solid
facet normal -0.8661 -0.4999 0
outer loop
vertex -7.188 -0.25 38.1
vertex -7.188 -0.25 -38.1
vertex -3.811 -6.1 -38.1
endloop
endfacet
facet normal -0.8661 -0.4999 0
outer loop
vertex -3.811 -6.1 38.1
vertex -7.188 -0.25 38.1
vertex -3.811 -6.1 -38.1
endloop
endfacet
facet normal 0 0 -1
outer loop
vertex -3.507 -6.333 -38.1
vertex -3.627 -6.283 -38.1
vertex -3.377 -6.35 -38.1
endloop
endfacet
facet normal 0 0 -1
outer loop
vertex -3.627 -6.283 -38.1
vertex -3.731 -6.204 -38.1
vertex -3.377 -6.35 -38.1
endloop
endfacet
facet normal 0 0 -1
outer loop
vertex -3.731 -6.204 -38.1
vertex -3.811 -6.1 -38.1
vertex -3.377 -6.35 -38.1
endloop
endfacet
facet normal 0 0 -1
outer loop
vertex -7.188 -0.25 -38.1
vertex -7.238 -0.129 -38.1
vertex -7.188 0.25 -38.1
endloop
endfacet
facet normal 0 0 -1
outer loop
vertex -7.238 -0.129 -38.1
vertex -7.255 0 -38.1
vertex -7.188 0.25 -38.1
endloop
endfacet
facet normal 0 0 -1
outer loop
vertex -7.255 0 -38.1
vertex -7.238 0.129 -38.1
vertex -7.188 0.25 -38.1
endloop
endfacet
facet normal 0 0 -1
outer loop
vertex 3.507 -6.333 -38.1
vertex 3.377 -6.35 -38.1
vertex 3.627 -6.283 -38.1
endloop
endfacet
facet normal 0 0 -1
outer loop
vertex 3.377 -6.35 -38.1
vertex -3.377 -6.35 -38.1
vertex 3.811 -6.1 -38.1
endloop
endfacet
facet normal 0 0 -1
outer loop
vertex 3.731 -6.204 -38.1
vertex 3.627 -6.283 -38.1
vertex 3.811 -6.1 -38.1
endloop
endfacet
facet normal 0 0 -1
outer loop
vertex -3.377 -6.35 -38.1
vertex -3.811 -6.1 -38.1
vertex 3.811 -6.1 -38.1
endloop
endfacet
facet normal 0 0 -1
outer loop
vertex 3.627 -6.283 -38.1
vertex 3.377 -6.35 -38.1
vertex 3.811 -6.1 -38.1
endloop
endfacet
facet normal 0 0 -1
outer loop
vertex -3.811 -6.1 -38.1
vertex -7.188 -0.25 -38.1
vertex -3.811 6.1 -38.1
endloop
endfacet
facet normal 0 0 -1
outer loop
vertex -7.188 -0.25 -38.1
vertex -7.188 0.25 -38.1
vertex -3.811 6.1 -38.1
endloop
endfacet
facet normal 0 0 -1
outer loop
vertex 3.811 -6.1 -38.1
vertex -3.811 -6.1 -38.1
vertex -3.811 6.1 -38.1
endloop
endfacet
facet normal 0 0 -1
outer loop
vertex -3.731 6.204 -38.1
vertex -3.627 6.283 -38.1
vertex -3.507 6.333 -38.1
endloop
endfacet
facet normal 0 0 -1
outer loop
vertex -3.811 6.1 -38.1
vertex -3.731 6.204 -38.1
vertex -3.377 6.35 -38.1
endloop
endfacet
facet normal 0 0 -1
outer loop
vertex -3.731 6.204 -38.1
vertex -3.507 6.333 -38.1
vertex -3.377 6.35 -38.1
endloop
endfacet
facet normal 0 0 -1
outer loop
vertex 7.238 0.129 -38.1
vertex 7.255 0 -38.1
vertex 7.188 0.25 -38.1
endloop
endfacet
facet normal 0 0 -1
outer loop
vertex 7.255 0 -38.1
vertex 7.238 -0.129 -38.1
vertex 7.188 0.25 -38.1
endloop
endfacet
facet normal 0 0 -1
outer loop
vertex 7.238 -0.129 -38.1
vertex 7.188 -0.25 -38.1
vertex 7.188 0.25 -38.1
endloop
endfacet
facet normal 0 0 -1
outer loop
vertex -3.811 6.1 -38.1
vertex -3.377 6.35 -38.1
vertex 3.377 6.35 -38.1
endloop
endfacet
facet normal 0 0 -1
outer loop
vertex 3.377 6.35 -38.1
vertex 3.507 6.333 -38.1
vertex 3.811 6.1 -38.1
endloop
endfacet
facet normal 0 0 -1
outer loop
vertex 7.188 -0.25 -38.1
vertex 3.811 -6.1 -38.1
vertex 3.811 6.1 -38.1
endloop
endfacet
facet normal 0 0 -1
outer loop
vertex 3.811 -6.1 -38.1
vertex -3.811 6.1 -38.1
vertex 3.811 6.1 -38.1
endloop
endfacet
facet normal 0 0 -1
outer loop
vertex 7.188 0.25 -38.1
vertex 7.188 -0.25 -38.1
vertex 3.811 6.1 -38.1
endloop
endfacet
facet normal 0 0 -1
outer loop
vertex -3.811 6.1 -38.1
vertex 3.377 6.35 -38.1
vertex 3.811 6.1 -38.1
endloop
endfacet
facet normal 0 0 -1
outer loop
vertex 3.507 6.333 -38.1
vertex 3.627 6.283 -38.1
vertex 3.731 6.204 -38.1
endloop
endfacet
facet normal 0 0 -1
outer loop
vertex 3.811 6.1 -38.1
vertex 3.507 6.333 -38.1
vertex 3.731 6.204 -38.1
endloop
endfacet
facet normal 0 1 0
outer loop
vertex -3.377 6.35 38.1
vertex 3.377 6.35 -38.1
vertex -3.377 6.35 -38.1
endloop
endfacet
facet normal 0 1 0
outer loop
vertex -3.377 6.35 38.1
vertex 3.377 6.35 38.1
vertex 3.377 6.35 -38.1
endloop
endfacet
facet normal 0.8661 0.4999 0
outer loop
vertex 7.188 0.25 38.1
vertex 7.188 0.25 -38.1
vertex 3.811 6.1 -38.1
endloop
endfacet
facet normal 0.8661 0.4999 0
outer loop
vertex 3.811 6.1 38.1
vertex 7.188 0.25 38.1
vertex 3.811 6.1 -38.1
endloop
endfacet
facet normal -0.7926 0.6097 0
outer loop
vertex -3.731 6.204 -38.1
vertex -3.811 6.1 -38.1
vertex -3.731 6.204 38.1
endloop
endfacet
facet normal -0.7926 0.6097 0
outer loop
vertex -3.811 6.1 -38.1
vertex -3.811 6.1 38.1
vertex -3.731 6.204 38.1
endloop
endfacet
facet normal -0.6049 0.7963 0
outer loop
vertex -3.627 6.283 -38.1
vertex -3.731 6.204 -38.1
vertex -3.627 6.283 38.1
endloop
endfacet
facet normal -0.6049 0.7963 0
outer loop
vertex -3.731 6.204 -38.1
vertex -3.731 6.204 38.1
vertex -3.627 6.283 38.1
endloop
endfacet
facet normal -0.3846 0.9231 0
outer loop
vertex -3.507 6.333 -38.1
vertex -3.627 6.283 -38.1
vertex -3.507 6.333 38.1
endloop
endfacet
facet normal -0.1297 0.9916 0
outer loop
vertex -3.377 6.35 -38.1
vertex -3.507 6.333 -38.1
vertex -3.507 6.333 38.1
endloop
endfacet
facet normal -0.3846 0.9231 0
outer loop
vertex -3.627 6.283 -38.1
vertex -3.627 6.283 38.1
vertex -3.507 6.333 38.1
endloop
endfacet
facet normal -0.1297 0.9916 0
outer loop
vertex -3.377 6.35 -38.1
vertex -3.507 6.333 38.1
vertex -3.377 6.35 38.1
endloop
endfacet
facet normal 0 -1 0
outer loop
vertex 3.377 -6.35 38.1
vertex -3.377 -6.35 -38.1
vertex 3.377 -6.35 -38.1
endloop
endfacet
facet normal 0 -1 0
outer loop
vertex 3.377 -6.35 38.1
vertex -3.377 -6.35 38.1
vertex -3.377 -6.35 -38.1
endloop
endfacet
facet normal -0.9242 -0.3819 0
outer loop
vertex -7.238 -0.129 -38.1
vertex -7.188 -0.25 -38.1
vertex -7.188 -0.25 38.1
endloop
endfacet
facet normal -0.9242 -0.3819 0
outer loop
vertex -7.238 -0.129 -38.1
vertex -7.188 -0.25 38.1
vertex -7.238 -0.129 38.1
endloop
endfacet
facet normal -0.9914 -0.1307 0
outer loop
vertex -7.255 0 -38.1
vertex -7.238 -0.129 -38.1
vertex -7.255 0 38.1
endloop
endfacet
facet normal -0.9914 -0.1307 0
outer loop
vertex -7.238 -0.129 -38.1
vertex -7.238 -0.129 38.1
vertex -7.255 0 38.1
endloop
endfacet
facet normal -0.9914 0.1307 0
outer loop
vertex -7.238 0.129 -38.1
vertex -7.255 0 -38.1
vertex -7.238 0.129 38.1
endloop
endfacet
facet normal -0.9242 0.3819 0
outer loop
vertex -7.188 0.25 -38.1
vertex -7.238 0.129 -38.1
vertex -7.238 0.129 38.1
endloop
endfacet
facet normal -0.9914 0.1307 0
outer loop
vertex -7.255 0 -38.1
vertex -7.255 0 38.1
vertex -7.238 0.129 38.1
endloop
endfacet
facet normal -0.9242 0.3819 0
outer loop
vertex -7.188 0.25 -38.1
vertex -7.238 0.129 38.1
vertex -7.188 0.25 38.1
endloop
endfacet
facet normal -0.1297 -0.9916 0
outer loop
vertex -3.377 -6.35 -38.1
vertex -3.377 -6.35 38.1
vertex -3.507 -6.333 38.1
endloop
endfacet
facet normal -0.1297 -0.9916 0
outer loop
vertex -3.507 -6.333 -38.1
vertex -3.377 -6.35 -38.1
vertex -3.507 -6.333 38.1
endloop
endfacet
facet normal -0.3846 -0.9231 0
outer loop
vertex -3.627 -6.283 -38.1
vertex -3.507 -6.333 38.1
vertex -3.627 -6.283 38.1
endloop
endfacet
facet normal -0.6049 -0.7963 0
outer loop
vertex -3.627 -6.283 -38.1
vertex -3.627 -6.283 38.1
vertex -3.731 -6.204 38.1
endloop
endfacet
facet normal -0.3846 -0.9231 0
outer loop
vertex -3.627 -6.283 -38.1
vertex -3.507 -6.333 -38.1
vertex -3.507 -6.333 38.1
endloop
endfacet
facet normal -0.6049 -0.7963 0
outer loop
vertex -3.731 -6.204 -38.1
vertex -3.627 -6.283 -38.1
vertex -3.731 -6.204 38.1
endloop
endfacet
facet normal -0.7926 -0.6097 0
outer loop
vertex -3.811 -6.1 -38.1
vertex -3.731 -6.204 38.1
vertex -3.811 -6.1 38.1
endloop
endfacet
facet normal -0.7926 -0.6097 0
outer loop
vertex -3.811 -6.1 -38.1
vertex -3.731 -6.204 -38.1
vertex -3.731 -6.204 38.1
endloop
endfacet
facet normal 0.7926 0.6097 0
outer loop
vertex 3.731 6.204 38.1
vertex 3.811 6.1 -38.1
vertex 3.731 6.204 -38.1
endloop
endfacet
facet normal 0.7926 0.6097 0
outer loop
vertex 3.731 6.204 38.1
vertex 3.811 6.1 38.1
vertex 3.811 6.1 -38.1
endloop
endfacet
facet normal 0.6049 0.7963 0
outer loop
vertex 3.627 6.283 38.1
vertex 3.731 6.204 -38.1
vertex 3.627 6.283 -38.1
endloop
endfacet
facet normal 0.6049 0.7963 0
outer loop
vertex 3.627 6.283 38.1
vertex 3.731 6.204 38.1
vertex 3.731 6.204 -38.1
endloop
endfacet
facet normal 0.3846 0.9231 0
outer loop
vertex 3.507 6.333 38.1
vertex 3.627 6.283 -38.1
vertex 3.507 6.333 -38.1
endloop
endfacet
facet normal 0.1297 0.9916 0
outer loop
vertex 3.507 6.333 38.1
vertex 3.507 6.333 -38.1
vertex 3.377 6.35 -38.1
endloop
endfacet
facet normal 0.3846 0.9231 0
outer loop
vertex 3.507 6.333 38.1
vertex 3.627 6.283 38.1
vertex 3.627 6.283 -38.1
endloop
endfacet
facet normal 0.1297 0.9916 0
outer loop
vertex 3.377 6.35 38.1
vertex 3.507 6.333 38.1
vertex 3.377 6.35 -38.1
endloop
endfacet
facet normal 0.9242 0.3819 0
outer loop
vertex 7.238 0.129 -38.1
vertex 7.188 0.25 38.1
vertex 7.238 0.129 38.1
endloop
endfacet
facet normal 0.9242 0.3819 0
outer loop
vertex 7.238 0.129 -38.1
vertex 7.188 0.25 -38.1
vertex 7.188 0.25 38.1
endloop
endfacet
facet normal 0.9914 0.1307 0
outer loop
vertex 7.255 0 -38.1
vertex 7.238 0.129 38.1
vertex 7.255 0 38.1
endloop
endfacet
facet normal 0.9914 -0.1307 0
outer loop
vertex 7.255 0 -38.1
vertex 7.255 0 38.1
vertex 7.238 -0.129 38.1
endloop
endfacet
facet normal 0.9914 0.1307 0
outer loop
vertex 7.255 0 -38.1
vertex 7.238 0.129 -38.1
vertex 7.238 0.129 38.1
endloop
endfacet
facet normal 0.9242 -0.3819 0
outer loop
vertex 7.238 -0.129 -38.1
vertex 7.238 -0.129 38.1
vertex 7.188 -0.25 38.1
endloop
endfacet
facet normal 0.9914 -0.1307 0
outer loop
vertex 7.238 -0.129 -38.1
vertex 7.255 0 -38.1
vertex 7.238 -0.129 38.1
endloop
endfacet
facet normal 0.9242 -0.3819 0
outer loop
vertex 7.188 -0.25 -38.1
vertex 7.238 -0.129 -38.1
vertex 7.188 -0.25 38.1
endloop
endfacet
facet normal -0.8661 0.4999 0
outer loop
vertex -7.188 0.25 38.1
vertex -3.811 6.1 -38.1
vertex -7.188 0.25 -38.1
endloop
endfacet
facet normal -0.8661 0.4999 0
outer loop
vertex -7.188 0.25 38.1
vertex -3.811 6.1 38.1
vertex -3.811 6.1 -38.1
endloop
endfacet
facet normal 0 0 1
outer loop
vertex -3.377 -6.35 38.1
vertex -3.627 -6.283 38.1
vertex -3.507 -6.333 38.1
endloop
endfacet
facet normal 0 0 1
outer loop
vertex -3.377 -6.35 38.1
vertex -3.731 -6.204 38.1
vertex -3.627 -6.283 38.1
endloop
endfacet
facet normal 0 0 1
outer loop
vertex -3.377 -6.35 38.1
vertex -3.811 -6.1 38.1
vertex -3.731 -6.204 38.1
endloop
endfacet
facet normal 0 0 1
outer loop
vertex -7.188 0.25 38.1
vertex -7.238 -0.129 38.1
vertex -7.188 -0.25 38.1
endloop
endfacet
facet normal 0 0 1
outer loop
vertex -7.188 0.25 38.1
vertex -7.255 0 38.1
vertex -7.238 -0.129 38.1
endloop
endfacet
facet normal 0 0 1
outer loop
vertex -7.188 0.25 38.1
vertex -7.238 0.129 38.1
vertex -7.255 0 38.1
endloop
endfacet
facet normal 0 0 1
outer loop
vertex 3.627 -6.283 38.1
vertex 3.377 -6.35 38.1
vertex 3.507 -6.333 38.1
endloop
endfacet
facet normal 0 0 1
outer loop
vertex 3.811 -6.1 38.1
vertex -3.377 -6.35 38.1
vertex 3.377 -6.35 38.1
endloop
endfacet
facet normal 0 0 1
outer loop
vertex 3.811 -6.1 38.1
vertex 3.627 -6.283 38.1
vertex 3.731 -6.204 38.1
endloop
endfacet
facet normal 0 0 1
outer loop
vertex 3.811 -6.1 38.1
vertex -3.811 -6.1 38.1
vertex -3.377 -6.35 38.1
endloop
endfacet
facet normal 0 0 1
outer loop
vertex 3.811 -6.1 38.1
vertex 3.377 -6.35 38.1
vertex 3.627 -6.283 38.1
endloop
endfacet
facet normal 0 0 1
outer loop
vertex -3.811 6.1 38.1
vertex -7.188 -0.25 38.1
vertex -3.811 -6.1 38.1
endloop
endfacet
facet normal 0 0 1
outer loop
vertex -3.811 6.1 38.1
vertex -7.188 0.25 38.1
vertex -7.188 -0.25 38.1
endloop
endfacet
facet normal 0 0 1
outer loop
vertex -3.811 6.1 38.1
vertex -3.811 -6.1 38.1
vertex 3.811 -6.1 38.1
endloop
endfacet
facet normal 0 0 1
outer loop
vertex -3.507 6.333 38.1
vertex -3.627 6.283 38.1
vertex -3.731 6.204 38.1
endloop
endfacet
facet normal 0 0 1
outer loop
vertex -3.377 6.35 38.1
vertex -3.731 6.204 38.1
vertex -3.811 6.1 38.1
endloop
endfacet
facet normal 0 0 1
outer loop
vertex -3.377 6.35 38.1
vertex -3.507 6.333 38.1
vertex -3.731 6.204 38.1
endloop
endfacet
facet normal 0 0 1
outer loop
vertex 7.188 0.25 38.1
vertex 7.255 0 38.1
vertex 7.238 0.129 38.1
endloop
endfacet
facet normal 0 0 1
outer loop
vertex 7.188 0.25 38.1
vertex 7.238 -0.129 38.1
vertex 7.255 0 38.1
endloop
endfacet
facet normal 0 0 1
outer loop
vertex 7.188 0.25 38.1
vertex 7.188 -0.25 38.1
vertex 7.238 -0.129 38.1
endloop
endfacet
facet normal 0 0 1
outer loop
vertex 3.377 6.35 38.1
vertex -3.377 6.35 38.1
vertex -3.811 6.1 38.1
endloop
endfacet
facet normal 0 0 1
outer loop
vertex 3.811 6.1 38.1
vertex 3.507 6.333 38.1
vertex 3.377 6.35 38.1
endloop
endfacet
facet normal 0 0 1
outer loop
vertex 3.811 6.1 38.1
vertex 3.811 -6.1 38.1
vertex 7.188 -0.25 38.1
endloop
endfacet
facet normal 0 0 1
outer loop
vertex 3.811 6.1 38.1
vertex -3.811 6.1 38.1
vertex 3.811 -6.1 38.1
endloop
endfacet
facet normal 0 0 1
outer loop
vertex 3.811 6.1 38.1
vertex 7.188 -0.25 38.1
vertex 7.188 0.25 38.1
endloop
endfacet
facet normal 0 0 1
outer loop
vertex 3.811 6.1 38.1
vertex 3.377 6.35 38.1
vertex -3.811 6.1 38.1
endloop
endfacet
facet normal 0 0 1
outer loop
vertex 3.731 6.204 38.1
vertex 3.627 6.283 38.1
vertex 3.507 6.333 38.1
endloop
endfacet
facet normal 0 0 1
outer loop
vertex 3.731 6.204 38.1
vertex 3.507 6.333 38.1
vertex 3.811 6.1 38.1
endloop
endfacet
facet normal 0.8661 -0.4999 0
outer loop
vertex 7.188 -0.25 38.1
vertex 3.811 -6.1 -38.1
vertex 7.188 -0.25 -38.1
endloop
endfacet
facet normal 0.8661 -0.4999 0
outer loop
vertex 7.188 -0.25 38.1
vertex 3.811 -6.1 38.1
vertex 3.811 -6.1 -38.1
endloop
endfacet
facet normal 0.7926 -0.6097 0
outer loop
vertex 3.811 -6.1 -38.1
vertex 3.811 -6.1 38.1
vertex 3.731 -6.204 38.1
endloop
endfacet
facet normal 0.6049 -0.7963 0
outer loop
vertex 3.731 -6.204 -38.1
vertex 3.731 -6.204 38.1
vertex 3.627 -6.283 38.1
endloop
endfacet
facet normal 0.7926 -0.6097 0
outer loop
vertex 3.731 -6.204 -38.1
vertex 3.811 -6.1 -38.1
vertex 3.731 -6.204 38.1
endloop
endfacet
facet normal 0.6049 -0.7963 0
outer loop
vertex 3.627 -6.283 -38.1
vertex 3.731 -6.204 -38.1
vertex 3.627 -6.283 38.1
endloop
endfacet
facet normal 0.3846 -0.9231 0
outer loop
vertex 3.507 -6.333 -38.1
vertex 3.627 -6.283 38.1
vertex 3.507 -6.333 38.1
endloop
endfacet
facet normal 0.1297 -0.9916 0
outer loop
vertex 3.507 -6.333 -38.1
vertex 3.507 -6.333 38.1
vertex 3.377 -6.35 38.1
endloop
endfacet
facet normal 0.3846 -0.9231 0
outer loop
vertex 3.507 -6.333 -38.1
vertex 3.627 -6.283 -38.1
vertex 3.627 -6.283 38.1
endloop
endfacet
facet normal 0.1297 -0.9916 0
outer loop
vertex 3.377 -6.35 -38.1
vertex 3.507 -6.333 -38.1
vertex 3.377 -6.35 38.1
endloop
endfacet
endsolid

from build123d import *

# Parameters (mm, degrees)
BOSS_EXTRUDE1_DEPTH = 38.1
FILLET1_R           = 0.5


with BuildPart() as part:
    # Sketch1 → Boss-Extrude1 (new, symmetric)
    with BuildSketch(Plane.XY):
        Polygon((7.332348419, 0), (3.666174209, 6.35), (-3.666174209, 6.35), (-7.332348419, 0), (-3.666174209, -6.35), (3.666174209, -6.35), align=None)
    extrude(amount=BOSS_EXTRUDE1_DEPTH, both=True)

    # Fillet1
    fillet1_edges = [part.edges().sort_by_distance(p)[0] for p in [
        (3.666174209, -6.35, 0),
        (-3.666174209, -6.35, 0),
        (-7.332348419, 0, 0),
        (-3.666174209, 6.35, 0),
        (3.666174209, 6.35, 0),
        (7.332348419, 0, 0),
    ]]
    fillet(fillet1_edges, radius=FILLET1_R)


solid = part.part
